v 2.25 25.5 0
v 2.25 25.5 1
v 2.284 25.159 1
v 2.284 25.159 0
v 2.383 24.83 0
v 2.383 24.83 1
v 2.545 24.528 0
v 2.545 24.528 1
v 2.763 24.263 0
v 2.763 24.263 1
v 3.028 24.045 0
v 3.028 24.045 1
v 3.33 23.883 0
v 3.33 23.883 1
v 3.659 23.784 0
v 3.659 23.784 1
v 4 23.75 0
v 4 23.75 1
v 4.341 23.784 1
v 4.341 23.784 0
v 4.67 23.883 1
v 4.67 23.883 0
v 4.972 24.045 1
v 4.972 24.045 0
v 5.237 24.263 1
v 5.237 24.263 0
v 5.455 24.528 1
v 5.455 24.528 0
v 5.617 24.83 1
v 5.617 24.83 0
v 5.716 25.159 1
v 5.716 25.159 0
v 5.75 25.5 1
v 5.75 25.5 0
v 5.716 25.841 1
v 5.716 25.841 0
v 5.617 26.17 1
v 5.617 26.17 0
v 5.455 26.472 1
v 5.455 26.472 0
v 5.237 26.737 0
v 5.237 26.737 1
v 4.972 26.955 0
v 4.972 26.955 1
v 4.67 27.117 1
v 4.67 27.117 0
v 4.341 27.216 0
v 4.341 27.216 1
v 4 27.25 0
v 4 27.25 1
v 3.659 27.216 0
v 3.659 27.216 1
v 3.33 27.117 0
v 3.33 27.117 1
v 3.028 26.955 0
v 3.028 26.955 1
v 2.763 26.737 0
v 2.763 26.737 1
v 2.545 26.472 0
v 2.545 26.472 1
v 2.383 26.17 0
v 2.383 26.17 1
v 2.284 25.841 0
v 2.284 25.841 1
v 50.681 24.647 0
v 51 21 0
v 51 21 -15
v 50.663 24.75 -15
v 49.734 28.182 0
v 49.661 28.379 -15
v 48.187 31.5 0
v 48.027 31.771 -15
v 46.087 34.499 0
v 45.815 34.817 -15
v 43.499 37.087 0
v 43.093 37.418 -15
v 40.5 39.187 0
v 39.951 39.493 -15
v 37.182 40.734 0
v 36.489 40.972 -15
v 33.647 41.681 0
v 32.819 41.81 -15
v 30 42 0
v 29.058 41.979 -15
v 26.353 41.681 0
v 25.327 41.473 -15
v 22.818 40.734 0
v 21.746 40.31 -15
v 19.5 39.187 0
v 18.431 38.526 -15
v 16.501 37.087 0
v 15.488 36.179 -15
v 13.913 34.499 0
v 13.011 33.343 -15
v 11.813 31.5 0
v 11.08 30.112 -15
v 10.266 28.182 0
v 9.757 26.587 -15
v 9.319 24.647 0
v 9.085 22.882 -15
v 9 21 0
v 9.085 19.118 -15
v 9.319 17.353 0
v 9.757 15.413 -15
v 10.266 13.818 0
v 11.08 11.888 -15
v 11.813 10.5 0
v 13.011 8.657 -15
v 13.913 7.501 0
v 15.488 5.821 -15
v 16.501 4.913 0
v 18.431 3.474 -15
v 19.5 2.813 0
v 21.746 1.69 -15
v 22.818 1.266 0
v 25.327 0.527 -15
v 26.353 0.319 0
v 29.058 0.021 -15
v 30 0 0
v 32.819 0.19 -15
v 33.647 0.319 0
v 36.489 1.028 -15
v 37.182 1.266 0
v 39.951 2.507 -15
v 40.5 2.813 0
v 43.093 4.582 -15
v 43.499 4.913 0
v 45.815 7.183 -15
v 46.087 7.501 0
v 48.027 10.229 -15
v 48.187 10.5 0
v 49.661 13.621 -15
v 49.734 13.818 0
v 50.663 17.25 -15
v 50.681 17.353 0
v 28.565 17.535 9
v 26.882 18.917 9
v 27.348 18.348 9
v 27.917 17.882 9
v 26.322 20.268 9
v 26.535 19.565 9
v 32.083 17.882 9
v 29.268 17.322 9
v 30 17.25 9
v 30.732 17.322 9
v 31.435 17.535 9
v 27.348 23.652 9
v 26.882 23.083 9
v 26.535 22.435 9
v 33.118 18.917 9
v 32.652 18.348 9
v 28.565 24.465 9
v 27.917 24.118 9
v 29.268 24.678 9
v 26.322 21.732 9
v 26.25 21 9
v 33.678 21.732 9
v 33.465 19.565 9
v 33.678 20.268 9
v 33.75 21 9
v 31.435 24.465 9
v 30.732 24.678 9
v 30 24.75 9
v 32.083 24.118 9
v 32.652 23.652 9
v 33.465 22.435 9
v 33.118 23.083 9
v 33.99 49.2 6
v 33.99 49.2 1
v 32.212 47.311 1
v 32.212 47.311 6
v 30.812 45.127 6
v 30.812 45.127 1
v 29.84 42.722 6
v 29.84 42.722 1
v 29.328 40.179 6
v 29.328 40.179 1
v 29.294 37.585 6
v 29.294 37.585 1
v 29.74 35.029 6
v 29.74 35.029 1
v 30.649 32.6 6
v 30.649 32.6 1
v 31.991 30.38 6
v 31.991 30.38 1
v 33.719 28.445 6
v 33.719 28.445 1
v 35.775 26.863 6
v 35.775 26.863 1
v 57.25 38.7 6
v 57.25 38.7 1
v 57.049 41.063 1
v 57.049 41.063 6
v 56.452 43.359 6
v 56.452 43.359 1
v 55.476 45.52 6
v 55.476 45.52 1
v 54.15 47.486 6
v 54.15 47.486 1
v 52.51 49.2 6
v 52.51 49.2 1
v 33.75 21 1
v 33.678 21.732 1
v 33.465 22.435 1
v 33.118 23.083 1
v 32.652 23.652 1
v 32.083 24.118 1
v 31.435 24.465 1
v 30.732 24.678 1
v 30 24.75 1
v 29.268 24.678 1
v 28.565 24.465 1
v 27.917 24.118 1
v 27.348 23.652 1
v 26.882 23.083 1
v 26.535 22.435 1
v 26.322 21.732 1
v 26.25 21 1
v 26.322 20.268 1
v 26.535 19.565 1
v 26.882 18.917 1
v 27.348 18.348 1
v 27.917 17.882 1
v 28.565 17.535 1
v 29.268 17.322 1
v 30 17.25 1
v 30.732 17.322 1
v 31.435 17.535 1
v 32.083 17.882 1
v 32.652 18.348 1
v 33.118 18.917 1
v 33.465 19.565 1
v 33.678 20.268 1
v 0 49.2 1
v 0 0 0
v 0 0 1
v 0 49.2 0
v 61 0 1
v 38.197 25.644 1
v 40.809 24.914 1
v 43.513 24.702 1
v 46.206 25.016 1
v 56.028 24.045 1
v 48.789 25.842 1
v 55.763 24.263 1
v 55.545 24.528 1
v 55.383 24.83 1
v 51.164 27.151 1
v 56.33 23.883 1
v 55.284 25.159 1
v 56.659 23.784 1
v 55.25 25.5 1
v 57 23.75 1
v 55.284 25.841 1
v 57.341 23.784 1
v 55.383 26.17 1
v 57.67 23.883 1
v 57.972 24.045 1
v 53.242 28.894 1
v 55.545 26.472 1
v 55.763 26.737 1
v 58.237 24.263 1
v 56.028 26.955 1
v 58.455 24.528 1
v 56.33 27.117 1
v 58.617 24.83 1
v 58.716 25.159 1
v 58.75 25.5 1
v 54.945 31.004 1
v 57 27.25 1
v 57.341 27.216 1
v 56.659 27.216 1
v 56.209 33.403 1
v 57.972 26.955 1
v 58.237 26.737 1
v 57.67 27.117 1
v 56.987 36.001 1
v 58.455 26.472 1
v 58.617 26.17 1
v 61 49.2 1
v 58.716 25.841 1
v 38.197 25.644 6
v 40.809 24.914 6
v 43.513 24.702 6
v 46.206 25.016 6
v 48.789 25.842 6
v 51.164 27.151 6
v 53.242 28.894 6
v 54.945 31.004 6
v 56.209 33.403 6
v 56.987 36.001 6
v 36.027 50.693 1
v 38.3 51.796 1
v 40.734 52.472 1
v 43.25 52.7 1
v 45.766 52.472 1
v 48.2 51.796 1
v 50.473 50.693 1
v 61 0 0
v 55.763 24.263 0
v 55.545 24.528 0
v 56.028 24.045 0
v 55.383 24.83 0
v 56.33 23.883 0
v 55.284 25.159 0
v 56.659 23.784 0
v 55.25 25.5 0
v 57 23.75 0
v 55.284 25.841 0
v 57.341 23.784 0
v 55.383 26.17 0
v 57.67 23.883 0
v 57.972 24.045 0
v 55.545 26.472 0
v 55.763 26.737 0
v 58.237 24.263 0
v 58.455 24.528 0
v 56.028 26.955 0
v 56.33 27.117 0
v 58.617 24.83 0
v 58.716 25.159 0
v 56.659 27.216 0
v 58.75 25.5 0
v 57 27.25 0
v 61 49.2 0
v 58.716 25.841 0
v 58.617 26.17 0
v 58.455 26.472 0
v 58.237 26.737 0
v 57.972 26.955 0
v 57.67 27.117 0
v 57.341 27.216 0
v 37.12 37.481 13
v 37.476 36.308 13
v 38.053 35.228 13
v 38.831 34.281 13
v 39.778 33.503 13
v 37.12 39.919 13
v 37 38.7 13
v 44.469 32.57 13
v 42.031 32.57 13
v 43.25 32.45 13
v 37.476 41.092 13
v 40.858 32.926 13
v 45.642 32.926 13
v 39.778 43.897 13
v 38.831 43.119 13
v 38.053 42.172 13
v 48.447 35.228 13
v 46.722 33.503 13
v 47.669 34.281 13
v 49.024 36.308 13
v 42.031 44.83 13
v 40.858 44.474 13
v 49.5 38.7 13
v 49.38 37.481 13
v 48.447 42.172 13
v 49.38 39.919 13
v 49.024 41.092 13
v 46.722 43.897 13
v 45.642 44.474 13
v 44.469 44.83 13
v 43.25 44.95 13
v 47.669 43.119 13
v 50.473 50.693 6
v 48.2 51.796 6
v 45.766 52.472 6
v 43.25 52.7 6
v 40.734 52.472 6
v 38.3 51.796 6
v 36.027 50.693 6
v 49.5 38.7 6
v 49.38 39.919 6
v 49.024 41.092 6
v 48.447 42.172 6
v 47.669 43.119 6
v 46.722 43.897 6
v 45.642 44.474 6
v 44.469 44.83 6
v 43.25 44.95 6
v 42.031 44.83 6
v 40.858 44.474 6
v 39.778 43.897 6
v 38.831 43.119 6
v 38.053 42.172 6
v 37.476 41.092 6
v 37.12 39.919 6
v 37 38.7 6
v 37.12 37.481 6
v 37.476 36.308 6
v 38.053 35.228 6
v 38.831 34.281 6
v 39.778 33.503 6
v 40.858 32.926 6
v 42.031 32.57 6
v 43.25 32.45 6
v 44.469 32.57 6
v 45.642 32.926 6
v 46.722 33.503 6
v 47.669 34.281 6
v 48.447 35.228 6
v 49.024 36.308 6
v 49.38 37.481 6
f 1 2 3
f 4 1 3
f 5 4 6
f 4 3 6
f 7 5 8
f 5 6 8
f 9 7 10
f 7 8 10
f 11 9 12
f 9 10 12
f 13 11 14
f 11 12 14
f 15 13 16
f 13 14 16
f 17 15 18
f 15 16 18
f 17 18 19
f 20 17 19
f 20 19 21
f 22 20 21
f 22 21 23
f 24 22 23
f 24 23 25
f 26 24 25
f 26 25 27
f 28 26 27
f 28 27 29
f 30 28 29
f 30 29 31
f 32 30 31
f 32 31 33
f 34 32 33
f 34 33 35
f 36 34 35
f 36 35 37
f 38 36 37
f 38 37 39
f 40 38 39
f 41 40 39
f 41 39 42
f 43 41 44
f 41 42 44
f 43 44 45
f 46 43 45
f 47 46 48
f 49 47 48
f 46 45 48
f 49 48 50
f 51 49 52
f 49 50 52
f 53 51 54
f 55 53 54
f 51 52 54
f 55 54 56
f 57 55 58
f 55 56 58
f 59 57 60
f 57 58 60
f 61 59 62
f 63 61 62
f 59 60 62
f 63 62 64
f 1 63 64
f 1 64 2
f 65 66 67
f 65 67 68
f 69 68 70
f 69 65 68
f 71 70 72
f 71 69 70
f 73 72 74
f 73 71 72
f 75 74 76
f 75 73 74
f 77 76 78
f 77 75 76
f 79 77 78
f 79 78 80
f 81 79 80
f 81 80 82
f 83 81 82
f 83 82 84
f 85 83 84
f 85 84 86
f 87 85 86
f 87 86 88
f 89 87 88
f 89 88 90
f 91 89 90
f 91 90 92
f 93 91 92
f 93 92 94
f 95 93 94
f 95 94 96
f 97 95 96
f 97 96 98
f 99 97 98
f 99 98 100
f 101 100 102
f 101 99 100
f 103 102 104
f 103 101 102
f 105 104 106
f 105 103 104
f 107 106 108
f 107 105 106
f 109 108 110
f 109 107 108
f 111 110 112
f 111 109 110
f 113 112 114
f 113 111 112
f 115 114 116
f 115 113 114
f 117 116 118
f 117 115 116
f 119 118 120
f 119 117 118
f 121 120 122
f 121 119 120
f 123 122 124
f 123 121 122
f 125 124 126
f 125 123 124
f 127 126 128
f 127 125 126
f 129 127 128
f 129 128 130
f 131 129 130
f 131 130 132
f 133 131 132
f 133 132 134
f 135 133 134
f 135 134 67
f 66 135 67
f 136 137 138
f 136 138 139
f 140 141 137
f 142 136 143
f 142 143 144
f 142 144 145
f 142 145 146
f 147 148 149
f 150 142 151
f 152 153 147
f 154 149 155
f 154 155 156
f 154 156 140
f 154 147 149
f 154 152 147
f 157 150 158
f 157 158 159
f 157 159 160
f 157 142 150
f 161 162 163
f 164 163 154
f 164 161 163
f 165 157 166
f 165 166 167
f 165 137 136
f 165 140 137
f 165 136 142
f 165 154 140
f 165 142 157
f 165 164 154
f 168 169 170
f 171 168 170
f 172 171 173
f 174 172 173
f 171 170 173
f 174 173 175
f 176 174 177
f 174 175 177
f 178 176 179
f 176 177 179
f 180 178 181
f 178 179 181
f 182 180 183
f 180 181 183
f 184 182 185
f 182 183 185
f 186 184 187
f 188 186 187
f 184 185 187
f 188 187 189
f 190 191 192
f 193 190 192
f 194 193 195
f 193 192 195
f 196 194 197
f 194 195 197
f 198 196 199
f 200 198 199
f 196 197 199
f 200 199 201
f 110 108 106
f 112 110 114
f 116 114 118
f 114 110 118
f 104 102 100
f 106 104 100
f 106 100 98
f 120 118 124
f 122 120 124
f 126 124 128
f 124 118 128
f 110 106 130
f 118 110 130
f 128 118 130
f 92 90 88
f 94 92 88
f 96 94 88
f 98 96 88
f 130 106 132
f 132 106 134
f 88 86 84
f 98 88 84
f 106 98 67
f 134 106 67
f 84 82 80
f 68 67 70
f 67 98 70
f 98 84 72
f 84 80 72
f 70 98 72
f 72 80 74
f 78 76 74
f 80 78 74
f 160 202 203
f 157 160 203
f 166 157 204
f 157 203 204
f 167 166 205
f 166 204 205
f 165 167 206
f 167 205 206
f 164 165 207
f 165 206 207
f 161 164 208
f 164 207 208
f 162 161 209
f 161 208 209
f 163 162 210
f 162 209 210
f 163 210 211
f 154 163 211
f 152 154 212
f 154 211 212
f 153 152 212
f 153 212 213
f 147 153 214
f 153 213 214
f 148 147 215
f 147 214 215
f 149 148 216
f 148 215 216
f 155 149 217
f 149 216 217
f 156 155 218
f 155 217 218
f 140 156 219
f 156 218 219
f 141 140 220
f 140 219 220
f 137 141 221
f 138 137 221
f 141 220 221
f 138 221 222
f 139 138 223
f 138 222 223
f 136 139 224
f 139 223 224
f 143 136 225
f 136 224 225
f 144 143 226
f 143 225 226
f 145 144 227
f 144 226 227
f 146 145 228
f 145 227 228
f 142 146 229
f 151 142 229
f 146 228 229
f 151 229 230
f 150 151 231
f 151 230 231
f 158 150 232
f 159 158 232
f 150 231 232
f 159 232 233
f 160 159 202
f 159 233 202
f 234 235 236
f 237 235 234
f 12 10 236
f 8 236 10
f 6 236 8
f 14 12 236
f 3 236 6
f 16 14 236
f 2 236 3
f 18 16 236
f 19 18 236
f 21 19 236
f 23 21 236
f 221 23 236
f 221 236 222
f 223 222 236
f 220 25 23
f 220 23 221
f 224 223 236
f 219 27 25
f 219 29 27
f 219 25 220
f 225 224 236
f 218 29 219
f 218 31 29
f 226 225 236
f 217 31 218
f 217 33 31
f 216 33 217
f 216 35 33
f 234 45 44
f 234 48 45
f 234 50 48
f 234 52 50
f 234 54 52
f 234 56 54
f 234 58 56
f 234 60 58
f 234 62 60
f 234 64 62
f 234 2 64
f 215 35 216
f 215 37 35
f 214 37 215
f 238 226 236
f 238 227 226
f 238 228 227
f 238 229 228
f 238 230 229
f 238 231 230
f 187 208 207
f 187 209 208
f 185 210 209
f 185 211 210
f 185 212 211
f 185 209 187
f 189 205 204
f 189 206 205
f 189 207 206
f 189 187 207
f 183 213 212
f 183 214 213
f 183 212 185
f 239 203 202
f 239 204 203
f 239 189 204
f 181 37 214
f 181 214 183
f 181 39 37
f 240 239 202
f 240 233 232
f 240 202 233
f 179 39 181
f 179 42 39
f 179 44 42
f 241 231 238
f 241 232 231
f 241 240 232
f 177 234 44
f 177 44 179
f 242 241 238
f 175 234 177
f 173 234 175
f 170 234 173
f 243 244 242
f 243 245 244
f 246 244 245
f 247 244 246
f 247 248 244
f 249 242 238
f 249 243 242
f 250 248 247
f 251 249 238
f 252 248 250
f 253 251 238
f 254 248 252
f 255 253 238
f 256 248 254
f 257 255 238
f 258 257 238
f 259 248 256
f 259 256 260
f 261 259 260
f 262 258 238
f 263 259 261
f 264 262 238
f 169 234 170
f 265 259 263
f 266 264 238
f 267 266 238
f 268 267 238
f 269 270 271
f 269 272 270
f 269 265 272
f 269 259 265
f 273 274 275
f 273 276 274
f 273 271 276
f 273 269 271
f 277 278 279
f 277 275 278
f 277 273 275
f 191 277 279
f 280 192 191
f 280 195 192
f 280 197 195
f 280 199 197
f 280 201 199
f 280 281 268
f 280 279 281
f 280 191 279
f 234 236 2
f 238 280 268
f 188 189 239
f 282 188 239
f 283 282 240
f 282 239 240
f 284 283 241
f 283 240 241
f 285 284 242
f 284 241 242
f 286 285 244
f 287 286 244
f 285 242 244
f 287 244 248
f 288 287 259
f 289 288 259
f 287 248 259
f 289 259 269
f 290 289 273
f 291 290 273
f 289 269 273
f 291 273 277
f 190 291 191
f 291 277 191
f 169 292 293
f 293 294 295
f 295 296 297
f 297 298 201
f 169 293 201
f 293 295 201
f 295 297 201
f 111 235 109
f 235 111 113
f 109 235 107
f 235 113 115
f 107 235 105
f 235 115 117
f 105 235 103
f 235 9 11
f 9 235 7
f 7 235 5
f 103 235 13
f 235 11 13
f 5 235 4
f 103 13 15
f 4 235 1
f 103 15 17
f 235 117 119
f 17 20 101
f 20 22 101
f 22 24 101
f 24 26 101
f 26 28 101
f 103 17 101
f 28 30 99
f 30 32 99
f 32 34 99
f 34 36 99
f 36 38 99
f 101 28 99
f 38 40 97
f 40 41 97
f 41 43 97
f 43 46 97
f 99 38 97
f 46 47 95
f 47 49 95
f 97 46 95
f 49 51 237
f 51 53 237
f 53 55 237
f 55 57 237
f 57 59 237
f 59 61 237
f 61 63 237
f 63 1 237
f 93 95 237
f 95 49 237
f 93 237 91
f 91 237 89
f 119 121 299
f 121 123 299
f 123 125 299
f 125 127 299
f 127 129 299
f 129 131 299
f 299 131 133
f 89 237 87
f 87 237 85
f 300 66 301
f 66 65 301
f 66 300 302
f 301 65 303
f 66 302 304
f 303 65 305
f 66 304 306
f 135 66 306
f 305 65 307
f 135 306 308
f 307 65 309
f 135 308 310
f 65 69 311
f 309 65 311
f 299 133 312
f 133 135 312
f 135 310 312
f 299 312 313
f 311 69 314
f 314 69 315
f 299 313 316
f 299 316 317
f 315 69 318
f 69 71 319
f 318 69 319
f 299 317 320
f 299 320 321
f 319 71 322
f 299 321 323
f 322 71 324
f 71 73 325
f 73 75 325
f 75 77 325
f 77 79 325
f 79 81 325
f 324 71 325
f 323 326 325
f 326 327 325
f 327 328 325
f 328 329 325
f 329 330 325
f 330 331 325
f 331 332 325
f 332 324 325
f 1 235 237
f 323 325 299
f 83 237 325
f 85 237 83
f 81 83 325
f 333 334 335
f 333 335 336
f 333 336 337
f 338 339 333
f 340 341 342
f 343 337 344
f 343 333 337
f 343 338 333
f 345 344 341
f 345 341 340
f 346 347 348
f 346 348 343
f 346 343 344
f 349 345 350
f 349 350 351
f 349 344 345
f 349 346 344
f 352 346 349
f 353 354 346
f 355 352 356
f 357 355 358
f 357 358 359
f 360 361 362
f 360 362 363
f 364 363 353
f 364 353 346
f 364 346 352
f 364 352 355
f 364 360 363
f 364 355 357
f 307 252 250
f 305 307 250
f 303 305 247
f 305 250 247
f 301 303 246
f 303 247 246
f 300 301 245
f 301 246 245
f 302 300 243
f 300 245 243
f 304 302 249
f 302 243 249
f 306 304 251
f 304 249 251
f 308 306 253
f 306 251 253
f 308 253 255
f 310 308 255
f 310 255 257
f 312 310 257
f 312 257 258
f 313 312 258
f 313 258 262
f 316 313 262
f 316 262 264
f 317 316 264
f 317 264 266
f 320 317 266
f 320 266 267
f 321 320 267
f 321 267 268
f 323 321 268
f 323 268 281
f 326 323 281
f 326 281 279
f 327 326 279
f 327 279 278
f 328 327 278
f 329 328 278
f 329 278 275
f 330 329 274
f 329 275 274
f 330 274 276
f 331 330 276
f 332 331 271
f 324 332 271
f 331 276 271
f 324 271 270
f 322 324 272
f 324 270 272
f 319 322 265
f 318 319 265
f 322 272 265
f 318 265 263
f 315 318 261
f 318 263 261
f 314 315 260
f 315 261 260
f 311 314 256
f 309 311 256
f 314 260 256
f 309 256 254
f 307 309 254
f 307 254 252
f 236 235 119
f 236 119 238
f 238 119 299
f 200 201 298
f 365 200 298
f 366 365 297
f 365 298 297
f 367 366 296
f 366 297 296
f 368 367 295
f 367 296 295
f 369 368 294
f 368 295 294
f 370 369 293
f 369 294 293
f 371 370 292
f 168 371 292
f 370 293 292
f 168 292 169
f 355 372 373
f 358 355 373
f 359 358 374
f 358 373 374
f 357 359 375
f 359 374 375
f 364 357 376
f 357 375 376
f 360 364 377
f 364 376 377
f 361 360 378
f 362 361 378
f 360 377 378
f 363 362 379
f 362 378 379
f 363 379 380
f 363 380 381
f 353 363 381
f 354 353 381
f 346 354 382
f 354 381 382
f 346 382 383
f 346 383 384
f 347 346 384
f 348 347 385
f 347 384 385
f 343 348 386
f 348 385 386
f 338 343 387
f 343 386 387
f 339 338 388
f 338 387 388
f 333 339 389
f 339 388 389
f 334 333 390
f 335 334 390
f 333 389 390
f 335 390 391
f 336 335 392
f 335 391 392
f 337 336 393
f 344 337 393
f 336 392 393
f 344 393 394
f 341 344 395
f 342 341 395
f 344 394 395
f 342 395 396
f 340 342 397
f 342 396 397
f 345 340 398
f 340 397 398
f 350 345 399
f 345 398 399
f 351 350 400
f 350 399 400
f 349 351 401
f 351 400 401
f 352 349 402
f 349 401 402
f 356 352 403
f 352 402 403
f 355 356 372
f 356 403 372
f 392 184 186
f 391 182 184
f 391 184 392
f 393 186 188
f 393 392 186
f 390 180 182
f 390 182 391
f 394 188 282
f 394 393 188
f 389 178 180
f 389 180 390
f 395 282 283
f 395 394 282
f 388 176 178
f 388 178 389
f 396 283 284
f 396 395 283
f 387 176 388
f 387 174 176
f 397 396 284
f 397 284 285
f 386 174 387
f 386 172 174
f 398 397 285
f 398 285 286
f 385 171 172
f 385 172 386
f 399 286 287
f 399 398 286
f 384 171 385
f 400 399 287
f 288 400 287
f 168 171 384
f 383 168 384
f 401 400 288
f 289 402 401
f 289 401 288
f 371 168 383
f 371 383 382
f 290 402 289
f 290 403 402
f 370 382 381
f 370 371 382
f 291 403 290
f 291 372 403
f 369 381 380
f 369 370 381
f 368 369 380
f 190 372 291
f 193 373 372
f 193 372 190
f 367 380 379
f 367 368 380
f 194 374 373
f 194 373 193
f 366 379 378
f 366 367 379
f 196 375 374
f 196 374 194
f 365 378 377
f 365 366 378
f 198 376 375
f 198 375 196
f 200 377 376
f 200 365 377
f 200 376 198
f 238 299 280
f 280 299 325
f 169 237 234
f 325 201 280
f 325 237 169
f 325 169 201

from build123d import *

# Parameters (mm, degrees)
F0_W     = 61
F0_H     = 49.2
F1_DEPTH = 1
F2_D     = 3.5
F3_R     = 3.75
F4_DEPTH = 8
F3_R_2   = 6.25
F5_DEPTH = 5
F6_R     = 21
F7_DEPTH = 15
F8_R     = 6.25
F9_DEPTH = 7


with BuildPart() as f1:
    # F0 (on Top) → F1 (new body)
    with BuildSketch(Plane.XY):
        with Locations((30.5, 24.6)):
            Rectangle(F0_W, F0_H)
    extrude(amount=F1_DEPTH)

    # F2 (through all)
    with Locations(Plane(origin=(0, 0, 0), x_dir=(1, 0, 0), z_dir=(0, 0, -1))):
        with Locations((4, -25.5), (57, -25.5)):
            Hole(F2_D / 2)

    # F3 (on face) → F4 (join)
    with BuildSketch(Plane.XY.offset(1)):
        with Locations((30, 21)):
            Circle(F3_R)
    extrude(amount=F4_DEPTH)

    # F3 (on face) → F5 (join)
    with BuildSketch(Plane.XY.offset(1)):
        with BuildLine():
            ThreePointArc((52.5101295887, 49.2), (43.25, 52.7), (33.9898704113, 49.2))
            Line((33.9898704113, 49.2), (52.5101295887, 49.2))
        make_face()
        with BuildLine():
            ThreePointArc((33.9898704113, 49.2), (29.2944841953, 37.5848414357), (35.7748003642, 26.8627118644))
            ThreePointArc((35.7748003642, 26.8627118644), (43.25, 30.5), (50.7251996358, 26.8627118644))
            ThreePointArc((50.7251996358, 26.8627118644), (55.5107665931, 31.9417751924), (57.25, 38.7))
            ThreePointArc((57.25, 38.7), (56.0101295887, 44.4601295887), (52.5101295887, 49.2))
            Line((52.5101295887, 49.2), (33.9898704113, 49.2))
        make_face()
        with Locations((43.25, 38.7)):
            Circle(F3_R_2, mode=Mode.SUBTRACT)
        with Locations((43.25, 38.7)):
            Circle(F3_R_2)
        with BuildLine():
            ThreePointArc((50.7251996358, 26.8627118644), (43.25, 30.5), (35.7748003642, 26.8627118644))
            ThreePointArc((35.7748003642, 26.8627118644), (43.25, 24.7), (50.7251996358, 26.8627118644))
        make_face()
    extrude(amount=F5_DEPTH)

    # F6 (on face) → F7 (join)
    with BuildSketch(Plane.XY):
        with Locations((30, 21)):
            Circle(F6_R)
    extrude(amount=-F7_DEPTH)

    # F8 (on face) → F9 (join)
    with BuildSketch(Plane.XY.offset(6)):
        with Locations((43.25, 38.7)):
            Circle(F8_R)
    extrude(amount=F9_DEPTH)


solid = f1.part
